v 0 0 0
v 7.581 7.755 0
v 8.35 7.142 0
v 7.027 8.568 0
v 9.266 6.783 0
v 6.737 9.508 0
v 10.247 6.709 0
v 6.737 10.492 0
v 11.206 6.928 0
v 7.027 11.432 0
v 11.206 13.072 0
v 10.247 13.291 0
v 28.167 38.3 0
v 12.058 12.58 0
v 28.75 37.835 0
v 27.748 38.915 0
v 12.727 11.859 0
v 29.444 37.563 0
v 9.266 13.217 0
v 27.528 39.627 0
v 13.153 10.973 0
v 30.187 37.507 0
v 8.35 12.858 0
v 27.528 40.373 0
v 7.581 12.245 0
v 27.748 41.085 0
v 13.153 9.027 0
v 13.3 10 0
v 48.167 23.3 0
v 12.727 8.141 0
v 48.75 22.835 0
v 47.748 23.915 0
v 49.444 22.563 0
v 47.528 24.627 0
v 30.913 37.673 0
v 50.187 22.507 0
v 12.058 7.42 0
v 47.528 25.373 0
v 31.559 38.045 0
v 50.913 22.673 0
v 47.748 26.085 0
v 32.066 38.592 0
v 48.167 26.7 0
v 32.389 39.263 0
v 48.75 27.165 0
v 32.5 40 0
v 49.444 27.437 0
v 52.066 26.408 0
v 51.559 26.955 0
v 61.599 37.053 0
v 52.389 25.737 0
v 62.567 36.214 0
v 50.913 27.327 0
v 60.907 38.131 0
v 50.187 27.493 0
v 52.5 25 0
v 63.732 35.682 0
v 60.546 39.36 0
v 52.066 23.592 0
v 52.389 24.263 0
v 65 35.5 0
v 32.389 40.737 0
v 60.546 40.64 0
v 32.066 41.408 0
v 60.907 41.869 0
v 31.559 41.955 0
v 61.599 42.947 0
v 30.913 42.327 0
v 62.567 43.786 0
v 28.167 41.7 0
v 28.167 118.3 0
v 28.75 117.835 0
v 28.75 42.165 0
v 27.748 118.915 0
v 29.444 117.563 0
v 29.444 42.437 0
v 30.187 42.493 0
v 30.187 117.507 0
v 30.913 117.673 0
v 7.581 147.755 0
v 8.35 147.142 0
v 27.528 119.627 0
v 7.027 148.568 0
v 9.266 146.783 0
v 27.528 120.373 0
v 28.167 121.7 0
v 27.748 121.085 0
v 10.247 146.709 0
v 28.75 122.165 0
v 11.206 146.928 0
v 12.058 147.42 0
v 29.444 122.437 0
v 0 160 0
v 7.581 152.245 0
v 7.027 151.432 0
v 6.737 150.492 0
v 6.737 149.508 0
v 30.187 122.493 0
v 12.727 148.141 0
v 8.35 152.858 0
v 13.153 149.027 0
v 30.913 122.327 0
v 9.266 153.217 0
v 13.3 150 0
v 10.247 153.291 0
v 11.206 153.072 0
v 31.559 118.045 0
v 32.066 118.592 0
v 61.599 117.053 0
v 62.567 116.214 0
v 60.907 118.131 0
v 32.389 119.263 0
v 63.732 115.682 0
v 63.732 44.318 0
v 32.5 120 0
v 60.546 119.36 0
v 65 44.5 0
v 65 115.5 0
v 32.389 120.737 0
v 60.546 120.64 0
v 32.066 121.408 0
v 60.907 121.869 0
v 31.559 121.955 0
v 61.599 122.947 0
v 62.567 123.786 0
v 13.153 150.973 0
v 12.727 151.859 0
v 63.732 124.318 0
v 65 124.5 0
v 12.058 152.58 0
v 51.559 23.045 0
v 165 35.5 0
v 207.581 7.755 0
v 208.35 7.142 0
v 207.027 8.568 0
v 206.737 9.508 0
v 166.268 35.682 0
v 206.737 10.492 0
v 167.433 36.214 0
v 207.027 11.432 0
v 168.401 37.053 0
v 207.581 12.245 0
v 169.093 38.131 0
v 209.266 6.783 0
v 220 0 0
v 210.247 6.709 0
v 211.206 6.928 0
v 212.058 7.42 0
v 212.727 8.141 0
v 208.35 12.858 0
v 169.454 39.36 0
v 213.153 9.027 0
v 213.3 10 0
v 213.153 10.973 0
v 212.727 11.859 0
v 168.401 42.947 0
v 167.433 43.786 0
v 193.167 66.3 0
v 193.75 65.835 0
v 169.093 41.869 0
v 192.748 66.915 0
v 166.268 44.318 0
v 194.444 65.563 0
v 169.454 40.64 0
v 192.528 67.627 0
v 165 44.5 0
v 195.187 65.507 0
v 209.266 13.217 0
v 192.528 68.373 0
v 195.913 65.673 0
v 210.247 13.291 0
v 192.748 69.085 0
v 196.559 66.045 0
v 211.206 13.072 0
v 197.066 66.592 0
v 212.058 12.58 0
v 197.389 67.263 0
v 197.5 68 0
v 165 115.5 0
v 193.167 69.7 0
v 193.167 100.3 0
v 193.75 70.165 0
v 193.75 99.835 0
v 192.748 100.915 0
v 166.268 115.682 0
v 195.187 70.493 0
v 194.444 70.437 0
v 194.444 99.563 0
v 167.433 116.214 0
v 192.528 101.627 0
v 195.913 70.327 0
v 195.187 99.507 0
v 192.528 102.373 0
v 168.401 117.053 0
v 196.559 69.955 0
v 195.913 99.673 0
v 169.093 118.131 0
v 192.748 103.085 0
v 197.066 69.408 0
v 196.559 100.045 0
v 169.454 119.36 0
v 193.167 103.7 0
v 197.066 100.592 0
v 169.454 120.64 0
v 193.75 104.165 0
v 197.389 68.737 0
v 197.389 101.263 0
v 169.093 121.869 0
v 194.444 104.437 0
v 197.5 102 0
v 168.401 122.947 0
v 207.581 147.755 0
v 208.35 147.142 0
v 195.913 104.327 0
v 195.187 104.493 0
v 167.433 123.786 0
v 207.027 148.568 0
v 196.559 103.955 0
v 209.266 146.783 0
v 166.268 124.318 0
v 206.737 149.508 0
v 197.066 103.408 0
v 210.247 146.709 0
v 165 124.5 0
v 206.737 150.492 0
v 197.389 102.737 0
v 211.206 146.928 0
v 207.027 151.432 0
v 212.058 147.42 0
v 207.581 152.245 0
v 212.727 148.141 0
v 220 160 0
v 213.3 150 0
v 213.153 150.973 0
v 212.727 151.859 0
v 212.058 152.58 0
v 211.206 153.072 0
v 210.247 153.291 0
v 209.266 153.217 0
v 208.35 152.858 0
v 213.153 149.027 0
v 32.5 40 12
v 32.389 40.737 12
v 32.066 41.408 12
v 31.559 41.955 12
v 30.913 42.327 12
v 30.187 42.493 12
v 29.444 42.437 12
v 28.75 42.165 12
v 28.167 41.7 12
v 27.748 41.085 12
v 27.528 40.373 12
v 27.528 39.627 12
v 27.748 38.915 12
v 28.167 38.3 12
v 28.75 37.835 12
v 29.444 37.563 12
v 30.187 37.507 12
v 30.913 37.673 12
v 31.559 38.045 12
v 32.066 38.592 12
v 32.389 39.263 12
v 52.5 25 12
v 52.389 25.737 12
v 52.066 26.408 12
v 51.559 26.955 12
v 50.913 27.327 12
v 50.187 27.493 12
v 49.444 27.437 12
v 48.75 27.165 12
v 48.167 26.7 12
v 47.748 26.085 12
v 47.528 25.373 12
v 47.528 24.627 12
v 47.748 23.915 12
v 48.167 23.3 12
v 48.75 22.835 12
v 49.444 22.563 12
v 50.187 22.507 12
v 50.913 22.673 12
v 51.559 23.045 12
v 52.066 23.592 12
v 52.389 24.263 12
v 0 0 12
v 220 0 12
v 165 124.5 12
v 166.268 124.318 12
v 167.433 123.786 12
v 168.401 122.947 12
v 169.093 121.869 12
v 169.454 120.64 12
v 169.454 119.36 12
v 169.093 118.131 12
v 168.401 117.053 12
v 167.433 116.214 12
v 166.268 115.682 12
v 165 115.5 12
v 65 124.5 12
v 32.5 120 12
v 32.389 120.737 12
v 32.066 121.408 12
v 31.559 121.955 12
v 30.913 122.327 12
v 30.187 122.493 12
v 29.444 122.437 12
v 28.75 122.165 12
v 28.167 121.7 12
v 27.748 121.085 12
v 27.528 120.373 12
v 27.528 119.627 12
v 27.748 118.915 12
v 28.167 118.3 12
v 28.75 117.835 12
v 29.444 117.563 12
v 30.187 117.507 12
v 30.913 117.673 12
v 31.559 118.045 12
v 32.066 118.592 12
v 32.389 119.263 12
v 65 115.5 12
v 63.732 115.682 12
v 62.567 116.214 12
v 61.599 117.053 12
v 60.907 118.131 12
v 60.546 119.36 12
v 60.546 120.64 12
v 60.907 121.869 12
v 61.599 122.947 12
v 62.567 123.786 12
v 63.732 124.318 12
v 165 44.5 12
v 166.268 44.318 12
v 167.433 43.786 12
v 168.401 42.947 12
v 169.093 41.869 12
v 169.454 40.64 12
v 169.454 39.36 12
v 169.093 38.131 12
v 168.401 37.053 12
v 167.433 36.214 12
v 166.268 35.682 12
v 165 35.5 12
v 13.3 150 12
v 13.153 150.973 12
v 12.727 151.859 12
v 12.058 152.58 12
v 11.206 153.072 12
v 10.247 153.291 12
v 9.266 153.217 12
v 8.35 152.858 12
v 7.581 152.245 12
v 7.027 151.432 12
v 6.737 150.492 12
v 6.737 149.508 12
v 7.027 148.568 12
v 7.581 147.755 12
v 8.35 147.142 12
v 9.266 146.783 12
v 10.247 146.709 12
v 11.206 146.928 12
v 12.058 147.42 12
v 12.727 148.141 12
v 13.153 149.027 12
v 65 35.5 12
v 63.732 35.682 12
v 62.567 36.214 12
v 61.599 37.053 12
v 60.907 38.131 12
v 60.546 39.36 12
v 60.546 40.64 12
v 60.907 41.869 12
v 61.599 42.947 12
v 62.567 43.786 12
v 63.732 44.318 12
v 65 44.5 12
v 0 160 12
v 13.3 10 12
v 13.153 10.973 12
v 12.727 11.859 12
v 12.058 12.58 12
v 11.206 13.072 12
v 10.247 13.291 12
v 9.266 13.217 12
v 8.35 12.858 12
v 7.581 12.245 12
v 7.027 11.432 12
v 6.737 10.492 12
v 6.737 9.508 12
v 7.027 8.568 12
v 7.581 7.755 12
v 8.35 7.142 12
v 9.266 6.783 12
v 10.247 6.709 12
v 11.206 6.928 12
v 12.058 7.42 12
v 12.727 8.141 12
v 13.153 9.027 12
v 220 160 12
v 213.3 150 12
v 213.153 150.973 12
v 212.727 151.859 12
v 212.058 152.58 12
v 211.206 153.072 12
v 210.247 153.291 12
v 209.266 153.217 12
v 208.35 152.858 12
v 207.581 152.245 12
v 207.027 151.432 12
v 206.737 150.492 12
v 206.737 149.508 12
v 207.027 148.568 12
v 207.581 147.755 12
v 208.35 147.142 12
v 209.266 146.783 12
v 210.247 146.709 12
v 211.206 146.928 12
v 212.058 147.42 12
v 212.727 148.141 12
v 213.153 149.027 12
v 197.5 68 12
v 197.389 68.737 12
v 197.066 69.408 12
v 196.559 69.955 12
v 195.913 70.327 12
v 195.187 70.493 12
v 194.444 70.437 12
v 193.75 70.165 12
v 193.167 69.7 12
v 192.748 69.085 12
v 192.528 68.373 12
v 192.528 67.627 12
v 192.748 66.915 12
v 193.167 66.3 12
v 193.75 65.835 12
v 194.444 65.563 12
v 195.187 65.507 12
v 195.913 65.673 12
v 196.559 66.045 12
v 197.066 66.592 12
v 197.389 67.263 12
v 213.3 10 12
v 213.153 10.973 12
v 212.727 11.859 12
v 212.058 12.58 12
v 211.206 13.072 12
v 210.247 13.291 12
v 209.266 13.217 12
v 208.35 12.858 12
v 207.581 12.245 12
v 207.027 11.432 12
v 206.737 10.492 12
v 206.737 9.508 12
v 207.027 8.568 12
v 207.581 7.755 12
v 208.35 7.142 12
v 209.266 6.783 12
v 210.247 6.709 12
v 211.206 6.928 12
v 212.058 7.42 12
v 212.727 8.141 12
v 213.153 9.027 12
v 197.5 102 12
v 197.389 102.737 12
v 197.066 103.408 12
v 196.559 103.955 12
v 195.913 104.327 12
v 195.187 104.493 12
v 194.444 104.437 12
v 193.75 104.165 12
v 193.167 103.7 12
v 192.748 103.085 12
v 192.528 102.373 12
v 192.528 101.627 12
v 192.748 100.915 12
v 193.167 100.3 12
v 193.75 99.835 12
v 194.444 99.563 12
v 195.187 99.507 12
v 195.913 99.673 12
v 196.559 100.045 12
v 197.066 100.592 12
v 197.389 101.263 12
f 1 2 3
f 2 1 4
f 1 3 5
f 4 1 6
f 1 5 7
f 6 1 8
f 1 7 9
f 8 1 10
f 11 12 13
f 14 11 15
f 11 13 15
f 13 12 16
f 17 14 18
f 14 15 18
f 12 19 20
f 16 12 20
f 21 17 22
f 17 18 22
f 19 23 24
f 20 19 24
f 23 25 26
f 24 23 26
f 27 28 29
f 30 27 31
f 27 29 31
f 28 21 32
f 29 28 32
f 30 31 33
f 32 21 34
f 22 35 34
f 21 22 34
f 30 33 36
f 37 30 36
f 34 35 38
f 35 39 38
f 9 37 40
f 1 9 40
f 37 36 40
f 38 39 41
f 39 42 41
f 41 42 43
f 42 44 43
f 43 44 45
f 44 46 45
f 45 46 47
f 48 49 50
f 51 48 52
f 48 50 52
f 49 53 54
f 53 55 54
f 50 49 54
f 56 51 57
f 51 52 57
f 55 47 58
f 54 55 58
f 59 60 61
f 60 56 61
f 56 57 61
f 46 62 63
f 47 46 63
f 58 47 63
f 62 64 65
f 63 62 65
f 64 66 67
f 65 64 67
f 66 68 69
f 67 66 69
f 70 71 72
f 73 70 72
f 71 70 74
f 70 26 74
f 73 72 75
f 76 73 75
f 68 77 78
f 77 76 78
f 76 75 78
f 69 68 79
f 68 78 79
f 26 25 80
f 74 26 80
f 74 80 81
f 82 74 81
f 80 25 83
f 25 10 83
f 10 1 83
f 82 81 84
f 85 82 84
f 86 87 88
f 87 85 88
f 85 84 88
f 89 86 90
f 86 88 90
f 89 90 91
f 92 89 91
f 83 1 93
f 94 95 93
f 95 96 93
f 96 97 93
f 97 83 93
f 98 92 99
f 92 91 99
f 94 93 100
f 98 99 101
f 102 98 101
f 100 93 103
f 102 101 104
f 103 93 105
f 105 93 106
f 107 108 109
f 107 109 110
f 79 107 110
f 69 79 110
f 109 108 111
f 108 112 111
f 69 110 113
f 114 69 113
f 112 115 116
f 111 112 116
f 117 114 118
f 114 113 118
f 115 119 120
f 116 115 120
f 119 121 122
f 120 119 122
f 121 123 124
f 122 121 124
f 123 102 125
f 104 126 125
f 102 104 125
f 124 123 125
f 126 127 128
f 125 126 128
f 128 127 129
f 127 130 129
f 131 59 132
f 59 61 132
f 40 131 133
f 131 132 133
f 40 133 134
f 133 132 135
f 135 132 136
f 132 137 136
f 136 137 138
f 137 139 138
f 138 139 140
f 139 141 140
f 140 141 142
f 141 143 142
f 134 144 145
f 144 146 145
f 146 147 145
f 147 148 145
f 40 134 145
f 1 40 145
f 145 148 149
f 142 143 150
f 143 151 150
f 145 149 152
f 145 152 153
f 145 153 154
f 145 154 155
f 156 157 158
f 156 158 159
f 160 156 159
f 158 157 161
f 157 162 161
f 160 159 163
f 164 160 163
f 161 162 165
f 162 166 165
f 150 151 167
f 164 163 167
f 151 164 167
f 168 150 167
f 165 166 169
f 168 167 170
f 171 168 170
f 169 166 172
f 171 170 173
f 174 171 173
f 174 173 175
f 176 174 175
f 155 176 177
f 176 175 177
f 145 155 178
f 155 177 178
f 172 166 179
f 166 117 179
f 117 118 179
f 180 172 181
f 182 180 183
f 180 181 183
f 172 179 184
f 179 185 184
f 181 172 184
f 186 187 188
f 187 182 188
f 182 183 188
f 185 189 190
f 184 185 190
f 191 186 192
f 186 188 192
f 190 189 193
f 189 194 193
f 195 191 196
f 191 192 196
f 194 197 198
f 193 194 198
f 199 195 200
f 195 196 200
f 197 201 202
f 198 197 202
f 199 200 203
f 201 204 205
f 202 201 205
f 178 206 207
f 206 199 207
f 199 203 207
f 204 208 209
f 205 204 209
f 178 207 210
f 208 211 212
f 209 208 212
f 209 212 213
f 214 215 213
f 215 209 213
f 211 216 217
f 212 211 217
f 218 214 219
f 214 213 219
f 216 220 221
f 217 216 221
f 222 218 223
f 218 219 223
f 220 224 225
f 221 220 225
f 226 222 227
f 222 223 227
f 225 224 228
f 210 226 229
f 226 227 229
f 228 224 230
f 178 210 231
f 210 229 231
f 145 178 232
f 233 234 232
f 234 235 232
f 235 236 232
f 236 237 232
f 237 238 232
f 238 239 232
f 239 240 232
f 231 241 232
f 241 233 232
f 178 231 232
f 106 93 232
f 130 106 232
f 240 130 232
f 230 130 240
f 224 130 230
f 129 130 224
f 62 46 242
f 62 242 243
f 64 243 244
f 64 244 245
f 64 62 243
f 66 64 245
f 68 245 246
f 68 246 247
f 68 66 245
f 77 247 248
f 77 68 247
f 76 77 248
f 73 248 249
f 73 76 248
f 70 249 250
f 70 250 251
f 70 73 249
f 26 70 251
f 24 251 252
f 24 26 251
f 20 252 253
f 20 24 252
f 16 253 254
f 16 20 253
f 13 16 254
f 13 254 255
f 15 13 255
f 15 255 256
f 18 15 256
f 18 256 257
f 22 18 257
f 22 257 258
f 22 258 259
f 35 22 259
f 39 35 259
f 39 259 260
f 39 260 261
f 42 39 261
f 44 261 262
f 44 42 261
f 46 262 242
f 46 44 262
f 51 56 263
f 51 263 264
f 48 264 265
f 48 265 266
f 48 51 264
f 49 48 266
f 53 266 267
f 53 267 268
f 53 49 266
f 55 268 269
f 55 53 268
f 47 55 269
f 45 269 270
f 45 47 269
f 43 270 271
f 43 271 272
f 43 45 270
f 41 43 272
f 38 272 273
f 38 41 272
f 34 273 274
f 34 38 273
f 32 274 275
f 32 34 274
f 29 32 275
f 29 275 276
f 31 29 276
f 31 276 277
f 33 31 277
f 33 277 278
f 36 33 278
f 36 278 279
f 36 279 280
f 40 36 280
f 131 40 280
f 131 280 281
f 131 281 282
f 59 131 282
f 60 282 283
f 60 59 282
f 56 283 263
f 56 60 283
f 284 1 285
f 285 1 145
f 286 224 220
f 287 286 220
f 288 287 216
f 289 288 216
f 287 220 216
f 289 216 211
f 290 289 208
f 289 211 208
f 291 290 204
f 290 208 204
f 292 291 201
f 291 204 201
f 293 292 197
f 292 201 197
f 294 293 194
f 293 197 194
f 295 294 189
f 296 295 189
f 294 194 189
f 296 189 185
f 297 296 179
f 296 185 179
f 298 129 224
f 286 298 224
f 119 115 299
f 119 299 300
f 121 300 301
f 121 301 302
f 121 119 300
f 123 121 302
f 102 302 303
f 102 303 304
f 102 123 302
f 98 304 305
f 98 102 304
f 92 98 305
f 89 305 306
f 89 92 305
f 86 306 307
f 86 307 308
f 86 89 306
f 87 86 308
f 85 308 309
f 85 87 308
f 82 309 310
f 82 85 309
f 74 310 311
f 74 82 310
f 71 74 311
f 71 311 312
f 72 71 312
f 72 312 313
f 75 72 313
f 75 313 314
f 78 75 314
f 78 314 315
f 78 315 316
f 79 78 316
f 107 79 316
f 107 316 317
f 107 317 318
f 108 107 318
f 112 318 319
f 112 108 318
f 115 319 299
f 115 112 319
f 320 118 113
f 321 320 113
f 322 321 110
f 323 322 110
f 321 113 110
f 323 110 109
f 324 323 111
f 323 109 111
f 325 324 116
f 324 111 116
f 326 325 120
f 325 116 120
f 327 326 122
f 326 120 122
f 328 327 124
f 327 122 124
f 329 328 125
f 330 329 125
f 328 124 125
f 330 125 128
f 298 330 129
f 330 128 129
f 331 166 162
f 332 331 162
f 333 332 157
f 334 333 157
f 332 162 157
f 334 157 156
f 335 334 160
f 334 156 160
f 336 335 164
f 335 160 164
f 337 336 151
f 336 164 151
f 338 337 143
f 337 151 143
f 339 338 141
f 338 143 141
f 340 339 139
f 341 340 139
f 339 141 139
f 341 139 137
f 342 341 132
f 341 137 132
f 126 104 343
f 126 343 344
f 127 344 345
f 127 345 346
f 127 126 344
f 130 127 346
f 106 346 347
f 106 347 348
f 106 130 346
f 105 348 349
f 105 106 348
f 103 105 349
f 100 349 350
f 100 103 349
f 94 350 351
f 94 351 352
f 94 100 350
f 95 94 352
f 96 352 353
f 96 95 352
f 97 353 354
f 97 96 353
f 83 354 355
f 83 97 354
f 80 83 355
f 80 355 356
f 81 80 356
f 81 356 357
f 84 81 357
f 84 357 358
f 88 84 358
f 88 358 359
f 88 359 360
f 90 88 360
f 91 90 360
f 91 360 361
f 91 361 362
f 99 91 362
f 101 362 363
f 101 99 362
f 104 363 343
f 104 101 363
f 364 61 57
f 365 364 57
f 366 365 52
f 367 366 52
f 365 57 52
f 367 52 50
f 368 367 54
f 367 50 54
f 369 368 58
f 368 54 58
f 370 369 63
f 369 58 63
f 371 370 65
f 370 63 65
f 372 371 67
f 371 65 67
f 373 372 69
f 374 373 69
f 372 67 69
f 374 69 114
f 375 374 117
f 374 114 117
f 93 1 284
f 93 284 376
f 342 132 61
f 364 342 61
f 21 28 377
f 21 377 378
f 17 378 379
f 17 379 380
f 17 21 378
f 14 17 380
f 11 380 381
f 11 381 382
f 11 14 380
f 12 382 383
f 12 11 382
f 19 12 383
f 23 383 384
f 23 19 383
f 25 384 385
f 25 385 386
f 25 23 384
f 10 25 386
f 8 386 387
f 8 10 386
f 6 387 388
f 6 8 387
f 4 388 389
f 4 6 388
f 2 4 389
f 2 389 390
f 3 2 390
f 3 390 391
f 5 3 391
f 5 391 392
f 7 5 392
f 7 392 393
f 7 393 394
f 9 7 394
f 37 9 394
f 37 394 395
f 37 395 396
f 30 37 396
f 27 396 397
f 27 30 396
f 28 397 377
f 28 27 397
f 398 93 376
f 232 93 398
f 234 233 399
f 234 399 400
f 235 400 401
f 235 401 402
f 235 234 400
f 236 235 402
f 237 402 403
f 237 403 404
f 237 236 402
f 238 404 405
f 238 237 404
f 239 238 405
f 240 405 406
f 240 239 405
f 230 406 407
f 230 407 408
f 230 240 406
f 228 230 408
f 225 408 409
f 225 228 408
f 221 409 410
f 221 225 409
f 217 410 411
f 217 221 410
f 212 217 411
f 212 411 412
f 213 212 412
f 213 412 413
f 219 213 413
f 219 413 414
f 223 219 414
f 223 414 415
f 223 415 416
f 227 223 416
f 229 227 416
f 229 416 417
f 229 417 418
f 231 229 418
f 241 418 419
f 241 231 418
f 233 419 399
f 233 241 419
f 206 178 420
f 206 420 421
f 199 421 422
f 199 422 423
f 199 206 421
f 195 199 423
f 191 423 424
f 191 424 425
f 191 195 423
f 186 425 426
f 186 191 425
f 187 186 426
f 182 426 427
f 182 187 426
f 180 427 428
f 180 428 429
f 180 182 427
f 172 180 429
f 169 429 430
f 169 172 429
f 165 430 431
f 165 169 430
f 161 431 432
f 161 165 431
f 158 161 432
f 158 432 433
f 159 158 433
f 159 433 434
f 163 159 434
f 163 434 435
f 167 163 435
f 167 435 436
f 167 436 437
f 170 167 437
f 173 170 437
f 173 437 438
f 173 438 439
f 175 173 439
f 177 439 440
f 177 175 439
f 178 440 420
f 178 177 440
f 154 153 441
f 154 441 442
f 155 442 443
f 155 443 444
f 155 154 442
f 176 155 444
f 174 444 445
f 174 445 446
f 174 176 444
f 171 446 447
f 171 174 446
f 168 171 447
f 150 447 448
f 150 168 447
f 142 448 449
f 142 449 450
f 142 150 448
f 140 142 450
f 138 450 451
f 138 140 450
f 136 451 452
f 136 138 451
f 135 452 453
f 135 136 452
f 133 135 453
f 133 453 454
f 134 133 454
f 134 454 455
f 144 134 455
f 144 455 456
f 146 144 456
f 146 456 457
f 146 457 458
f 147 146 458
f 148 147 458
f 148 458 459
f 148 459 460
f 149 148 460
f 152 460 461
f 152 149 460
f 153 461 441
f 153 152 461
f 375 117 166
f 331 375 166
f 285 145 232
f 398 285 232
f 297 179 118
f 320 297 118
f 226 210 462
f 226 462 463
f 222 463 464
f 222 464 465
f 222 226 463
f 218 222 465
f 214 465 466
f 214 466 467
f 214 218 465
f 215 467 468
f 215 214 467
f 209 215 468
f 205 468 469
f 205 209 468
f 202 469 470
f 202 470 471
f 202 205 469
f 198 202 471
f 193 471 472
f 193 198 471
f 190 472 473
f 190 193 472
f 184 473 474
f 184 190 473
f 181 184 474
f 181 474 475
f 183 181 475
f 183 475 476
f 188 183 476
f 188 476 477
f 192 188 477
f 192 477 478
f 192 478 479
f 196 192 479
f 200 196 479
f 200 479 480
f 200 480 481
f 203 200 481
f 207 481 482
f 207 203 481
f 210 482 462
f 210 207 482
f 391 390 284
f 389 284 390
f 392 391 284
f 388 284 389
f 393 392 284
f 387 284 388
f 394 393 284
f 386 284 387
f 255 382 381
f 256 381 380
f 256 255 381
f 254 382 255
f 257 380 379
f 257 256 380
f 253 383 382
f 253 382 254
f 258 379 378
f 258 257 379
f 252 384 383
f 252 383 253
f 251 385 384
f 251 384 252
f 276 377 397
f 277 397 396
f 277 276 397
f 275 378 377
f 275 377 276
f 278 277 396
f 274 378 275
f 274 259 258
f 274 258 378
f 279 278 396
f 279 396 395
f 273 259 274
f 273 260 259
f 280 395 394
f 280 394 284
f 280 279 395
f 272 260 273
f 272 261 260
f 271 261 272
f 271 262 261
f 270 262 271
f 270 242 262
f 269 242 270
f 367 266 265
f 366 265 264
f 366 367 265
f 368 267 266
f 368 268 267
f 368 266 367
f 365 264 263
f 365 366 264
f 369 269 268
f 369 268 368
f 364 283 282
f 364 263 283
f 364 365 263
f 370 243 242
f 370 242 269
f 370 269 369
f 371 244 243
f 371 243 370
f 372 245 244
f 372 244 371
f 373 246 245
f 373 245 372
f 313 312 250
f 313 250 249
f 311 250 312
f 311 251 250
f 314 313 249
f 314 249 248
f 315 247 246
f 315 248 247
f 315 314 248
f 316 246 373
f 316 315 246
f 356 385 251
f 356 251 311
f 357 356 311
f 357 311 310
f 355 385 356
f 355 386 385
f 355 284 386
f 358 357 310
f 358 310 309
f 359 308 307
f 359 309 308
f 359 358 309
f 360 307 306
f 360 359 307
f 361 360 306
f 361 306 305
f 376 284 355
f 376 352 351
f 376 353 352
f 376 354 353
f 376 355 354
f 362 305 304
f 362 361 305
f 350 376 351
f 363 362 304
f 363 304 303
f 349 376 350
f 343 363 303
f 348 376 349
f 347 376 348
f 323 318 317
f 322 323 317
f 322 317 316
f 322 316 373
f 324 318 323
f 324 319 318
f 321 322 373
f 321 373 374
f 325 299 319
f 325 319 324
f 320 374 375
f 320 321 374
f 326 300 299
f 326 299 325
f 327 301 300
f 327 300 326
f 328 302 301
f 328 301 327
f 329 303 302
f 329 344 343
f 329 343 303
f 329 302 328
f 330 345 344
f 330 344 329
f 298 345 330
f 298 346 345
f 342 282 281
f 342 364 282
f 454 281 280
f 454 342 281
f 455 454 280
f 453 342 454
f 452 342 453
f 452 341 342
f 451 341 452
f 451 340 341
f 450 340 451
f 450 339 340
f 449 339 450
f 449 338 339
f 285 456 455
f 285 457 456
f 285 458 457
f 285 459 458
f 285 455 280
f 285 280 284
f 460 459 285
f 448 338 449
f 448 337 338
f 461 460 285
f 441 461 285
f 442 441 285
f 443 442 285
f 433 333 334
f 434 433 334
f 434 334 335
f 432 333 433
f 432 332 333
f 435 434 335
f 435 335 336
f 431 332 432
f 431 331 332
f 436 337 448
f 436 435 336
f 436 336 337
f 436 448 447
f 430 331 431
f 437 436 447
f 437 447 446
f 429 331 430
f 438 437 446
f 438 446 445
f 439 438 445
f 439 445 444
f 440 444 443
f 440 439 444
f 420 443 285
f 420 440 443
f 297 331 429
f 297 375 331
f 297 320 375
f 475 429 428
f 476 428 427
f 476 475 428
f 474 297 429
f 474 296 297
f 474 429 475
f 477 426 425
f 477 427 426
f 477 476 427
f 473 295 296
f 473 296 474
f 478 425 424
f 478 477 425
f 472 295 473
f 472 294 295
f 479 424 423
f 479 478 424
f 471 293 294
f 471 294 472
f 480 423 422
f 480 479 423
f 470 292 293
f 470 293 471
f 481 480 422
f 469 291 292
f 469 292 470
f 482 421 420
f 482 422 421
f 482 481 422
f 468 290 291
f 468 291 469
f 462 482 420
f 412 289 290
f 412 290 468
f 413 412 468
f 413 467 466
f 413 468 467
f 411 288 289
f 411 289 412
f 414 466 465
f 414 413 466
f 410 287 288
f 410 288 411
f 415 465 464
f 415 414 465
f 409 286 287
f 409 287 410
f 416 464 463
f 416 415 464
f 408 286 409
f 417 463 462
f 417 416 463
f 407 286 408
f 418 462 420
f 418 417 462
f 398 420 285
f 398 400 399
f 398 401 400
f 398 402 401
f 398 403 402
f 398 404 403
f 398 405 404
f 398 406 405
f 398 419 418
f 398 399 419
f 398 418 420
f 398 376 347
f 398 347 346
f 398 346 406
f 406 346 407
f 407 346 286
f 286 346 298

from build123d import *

# Parameters (mm, degrees)
SKETCH_1_W                  = 220
SKETCH_1_H                  = 160
SKETCH_1_R                  = 3.3
SKETCH_1_R_2                = 2.5
BASE_PLATE_220X160X12_DEPTH = 12


with BuildPart() as part:
    # 草图1 → Base_plate_220x160x12 (new body)
    with BuildSketch(Plane.XY):
        with Locations((110, 80)):
            Rectangle(SKETCH_1_W, SKETCH_1_H)
        with Locations((10, 10)):
            Circle(SKETCH_1_R, mode=Mode.SUBTRACT)
        with Locations((10, 150)):
            Circle(SKETCH_1_R, mode=Mode.SUBTRACT)
        with Locations((210, 10)):
            Circle(SKETCH_1_R, mode=Mode.SUBTRACT)
        with Locations((210, 150)):
            Circle(SKETCH_1_R, mode=Mode.SUBTRACT)
        with Locations((30, 40)):
            Circle(SKETCH_1_R_2, mode=Mode.SUBTRACT)
        with Locations((30, 120)):
            Circle(SKETCH_1_R_2, mode=Mode.SUBTRACT)
        with Locations((50, 25)):
            Circle(SKETCH_1_R_2, mode=Mode.SUBTRACT)
        with Locations((195, 68)):
            Circle(SKETCH_1_R_2, mode=Mode.SUBTRACT)
        with Locations((195, 102)):
            Circle(SKETCH_1_R_2, mode=Mode.SUBTRACT)
        with BuildLine():
            Line((65, 44.5), (165, 44.5))
            ThreePointArc((165, 44.5), (169.5, 40), (165, 35.5))
            Line((165, 35.5), (65, 35.5))
            ThreePointArc((65, 35.5), (60.5, 40), (65, 44.5))
        make_face(mode=Mode.SUBTRACT)
        with BuildLine():
            Line((65, 124.5), (165, 124.5))
            ThreePointArc((165, 124.5), (169.5, 120), (165, 115.5))
            Line((165, 115.5), (65, 115.5))
            ThreePointArc((65, 115.5), (60.5, 120), (65, 124.5))
        make_face(mode=Mode.SUBTRACT)
    extrude(amount=BASE_PLATE_220X160X12_DEPTH)


solid = part.part
